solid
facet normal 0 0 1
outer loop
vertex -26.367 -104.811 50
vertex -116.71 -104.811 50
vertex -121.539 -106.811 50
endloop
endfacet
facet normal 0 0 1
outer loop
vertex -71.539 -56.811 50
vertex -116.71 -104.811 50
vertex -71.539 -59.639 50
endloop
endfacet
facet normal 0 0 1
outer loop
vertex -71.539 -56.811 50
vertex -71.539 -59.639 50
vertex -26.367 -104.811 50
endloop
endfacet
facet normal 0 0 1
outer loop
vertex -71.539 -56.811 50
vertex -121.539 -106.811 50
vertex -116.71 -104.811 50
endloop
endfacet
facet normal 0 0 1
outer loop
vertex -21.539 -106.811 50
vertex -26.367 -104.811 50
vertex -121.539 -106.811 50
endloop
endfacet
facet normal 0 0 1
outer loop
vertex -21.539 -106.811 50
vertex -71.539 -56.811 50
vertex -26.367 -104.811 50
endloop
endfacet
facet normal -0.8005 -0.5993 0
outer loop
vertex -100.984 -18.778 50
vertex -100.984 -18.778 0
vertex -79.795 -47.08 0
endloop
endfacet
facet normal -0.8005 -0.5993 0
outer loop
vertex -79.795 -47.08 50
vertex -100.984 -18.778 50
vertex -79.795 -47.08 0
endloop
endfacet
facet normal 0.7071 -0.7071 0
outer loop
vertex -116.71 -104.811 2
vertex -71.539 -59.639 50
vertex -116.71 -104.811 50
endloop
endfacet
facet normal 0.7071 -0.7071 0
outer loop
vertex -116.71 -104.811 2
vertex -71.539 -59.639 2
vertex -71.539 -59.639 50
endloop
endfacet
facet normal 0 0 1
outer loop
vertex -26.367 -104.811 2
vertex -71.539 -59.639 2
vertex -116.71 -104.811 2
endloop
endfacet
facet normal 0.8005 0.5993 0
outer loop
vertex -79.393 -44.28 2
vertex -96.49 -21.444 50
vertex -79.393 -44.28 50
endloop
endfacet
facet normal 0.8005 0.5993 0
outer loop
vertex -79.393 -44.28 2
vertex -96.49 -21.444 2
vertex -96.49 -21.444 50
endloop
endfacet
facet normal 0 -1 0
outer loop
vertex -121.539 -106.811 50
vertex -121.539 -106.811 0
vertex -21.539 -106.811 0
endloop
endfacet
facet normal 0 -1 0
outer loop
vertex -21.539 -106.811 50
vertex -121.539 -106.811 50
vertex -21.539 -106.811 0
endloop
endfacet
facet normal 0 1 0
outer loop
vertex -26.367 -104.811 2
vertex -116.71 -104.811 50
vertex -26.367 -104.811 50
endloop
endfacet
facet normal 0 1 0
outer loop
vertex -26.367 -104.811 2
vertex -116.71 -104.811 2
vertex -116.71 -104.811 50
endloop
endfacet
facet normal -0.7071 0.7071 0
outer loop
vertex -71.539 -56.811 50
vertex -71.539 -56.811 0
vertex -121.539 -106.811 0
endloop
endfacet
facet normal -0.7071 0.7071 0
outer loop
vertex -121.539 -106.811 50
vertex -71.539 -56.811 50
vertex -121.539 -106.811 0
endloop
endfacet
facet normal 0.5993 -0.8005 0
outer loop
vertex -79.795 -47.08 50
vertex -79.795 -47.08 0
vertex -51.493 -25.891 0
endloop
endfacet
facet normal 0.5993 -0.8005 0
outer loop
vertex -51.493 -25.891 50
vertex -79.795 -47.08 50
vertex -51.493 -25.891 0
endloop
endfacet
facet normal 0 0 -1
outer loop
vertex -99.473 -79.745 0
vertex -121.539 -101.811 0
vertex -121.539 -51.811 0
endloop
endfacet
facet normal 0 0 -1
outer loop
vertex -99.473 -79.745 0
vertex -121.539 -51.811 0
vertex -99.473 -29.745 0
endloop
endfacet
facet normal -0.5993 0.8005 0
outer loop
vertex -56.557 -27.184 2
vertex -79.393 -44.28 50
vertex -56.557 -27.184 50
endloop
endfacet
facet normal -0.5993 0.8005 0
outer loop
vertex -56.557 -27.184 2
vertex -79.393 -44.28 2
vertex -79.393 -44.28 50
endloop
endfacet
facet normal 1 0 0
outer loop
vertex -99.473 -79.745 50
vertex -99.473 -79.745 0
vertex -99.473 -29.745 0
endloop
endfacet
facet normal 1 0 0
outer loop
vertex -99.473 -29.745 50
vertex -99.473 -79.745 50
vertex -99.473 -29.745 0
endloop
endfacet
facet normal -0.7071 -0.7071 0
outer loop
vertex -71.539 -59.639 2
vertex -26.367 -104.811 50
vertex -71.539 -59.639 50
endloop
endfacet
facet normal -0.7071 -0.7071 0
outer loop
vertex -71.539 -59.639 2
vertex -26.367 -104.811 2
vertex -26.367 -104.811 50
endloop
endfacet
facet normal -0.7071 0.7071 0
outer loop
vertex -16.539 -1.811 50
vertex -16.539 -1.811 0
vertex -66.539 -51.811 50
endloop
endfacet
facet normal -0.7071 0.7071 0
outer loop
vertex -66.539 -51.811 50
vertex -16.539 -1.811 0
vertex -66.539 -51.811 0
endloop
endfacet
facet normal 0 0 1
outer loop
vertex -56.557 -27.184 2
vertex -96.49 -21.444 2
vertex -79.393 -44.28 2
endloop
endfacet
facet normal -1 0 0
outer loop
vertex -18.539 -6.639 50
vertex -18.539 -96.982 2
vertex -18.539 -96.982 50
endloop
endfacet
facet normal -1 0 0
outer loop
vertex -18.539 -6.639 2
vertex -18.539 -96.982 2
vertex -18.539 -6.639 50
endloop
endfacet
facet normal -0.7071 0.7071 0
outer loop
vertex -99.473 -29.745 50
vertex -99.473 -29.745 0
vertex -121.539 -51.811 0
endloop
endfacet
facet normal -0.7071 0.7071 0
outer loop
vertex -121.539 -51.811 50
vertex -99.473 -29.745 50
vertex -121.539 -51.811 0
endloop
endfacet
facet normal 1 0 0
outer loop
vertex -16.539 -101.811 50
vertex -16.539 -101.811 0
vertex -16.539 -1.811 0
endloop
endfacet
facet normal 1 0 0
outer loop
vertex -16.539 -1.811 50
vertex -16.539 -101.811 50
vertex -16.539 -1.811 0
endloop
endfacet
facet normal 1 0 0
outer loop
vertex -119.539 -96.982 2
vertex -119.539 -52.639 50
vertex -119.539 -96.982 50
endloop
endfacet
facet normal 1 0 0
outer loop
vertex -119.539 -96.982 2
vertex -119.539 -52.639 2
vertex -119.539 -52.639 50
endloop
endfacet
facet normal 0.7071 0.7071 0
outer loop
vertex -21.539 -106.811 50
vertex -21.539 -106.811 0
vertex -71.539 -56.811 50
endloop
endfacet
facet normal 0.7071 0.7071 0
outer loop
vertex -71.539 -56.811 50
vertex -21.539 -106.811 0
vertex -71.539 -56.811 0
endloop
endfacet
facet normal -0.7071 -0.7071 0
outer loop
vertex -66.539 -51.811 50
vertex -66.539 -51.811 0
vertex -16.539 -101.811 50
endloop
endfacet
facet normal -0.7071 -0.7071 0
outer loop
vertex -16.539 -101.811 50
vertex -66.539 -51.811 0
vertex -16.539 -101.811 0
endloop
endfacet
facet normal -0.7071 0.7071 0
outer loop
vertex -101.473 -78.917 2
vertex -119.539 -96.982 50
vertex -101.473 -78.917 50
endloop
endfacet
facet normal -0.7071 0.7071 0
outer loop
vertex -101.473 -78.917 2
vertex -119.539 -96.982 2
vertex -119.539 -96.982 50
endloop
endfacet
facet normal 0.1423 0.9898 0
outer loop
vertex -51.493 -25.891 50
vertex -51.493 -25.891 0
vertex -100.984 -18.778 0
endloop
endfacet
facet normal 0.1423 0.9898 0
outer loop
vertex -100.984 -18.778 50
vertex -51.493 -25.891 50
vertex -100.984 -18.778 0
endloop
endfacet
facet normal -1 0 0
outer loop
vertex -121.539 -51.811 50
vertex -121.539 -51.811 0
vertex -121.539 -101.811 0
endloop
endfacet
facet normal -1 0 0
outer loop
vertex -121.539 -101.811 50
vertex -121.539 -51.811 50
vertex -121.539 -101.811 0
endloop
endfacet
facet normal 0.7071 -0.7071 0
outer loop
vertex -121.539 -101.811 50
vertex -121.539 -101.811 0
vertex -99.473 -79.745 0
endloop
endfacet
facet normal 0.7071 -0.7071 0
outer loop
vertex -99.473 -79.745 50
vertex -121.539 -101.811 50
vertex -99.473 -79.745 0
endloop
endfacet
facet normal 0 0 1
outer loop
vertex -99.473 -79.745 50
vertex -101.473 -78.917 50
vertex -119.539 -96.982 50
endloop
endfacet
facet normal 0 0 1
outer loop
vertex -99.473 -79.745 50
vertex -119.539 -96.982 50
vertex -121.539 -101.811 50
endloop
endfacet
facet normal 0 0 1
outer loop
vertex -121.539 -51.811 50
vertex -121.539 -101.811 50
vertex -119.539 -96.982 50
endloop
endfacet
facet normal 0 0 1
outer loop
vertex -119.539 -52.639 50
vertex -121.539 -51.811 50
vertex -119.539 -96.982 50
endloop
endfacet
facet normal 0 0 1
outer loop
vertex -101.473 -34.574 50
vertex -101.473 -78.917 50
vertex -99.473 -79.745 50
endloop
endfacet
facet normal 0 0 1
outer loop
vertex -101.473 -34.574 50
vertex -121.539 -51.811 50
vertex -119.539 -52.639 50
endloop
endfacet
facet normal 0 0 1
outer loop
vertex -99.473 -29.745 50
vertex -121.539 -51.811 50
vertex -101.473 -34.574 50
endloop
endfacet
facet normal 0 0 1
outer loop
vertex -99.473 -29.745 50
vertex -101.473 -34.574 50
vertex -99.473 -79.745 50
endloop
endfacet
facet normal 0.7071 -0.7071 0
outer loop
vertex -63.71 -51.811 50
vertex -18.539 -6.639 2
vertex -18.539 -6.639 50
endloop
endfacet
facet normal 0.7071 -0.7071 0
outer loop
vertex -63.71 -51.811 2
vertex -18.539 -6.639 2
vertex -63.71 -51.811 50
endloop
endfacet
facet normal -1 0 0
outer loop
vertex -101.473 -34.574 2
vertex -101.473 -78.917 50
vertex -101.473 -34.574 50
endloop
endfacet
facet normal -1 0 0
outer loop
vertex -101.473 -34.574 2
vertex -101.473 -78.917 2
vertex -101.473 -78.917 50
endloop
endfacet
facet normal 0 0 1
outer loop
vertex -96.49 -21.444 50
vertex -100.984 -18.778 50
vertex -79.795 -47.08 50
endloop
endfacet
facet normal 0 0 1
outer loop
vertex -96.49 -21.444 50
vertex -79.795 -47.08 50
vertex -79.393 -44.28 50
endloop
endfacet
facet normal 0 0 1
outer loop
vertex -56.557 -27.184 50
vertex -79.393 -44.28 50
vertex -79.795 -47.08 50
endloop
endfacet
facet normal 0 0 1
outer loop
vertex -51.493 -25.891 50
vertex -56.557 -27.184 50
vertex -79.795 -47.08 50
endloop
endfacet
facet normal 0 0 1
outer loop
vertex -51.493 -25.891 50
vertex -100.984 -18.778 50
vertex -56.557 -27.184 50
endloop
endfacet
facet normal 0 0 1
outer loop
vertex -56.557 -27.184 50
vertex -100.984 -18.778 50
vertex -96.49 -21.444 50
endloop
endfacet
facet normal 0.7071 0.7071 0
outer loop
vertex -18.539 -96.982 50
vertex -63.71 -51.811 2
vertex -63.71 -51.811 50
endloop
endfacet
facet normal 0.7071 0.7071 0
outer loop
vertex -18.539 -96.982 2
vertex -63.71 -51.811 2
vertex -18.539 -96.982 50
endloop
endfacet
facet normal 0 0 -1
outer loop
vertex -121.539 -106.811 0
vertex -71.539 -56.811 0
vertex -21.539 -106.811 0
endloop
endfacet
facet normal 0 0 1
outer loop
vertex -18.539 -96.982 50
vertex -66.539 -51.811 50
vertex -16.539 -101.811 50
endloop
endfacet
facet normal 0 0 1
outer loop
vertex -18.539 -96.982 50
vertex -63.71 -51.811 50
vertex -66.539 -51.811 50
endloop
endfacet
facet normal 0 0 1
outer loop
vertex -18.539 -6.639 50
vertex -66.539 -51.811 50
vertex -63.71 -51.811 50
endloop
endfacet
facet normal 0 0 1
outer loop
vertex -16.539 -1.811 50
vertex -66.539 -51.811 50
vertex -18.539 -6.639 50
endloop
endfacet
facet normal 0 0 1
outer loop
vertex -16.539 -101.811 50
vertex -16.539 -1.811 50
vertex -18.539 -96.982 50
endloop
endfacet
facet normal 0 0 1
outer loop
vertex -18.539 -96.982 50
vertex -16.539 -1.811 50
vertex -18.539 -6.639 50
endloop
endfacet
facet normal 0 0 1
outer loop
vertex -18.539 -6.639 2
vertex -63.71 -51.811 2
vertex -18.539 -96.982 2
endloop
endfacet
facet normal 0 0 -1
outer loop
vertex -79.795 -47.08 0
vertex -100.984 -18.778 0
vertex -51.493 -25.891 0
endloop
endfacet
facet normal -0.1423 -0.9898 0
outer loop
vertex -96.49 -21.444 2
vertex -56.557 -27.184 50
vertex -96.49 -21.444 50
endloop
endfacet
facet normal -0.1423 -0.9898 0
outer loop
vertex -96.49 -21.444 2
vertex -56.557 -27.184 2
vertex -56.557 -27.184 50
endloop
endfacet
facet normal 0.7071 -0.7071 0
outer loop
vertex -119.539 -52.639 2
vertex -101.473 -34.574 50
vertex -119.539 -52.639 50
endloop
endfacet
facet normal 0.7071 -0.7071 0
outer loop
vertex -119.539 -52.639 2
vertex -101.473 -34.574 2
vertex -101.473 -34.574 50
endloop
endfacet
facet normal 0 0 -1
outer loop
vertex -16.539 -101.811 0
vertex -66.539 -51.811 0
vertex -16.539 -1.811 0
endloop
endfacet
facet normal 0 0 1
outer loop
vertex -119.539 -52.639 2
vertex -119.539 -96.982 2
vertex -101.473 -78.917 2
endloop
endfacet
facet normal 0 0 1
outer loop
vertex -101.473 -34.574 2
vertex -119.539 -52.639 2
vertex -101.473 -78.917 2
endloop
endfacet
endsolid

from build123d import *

# Parameters (mm, degrees)
F1_DEPTH = 50
F2_T     = -2
F2_2_T   = -2
F2_3_T   = -2
F2_4_T   = -2


# Not quite as in the source:
# - a feature names something its author has since deleted; it is built from what else it names


with BuildPart() as f1:
    # F0 (on Top) → F1 (new body)
    with BuildSketch(Plane.XY):
        Polygon((-16.5389066256, -1.8107631532), (-66.5389066256, -51.8107631532), (-16.5389066256, -101.8107631532), align=None)
    extrude(amount=F1_DEPTH)

    # F2
    f2_openings = [f1.faces().sort_by_distance(p)[0] for p in [
        (-33.205573, -51.810763, 50),
    ]]
    offset(amount=F2_T, openings=f2_openings)


with BuildPart() as f1b:
    # F0 (on Top) → F1, piece 2 (new body)
    with BuildSketch(Plane.XY):
        Polygon((-100.9843560544, -18.7777006427), (-79.7953103328, -47.0800740662), (-51.4929369092, -25.8910283446), align=None)
    extrude(amount=F1_DEPTH)

    # F2#3
    f2_3_openings = [f1b.faces().sort_by_distance(p)[0] for p in [
        (-77.424201, -30.582934, 50),
    ]]
    offset(amount=F2_3_T, openings=f2_3_openings)


with BuildPart() as f1c:
    # F0 (on Top) → F1, piece 3 (new body)
    with BuildSketch(Plane.XY):
        Polygon((-99.47348535, -29.7453418775), (-121.5389066256, -51.8107631532), (-121.5389066256, -101.8107631532), (-99.47348535, -79.7453418775), align=None)
    extrude(amount=F1_DEPTH)

    # F2#4
    f2_4_openings = [f1c.faces().sort_by_distance(p)[0] for p in [
        (-110.506196, -65.778053, 50),
    ]]
    offset(amount=F2_4_T, openings=f2_4_openings)


with BuildPart() as f1d:
    # F0 (on Top) → F1, piece 4 (new body)
    with BuildSketch(Plane.XY):
        Polygon((-71.5389066256, -56.8107631532), (-121.5389066256, -106.8107631532), (-21.5389066256, -106.8107631532), align=None)
    extrude(amount=F1_DEPTH)

    # F2#2
    f2_2_openings = [f1d.faces().sort_by_distance(p)[0] for p in [
        (-71.538907, -90.144096, 50),
    ]]
    offset(amount=F2_2_T, openings=f2_2_openings)


solid = Compound([f1.part, f1b.part, f1c.part, f1d.part])
